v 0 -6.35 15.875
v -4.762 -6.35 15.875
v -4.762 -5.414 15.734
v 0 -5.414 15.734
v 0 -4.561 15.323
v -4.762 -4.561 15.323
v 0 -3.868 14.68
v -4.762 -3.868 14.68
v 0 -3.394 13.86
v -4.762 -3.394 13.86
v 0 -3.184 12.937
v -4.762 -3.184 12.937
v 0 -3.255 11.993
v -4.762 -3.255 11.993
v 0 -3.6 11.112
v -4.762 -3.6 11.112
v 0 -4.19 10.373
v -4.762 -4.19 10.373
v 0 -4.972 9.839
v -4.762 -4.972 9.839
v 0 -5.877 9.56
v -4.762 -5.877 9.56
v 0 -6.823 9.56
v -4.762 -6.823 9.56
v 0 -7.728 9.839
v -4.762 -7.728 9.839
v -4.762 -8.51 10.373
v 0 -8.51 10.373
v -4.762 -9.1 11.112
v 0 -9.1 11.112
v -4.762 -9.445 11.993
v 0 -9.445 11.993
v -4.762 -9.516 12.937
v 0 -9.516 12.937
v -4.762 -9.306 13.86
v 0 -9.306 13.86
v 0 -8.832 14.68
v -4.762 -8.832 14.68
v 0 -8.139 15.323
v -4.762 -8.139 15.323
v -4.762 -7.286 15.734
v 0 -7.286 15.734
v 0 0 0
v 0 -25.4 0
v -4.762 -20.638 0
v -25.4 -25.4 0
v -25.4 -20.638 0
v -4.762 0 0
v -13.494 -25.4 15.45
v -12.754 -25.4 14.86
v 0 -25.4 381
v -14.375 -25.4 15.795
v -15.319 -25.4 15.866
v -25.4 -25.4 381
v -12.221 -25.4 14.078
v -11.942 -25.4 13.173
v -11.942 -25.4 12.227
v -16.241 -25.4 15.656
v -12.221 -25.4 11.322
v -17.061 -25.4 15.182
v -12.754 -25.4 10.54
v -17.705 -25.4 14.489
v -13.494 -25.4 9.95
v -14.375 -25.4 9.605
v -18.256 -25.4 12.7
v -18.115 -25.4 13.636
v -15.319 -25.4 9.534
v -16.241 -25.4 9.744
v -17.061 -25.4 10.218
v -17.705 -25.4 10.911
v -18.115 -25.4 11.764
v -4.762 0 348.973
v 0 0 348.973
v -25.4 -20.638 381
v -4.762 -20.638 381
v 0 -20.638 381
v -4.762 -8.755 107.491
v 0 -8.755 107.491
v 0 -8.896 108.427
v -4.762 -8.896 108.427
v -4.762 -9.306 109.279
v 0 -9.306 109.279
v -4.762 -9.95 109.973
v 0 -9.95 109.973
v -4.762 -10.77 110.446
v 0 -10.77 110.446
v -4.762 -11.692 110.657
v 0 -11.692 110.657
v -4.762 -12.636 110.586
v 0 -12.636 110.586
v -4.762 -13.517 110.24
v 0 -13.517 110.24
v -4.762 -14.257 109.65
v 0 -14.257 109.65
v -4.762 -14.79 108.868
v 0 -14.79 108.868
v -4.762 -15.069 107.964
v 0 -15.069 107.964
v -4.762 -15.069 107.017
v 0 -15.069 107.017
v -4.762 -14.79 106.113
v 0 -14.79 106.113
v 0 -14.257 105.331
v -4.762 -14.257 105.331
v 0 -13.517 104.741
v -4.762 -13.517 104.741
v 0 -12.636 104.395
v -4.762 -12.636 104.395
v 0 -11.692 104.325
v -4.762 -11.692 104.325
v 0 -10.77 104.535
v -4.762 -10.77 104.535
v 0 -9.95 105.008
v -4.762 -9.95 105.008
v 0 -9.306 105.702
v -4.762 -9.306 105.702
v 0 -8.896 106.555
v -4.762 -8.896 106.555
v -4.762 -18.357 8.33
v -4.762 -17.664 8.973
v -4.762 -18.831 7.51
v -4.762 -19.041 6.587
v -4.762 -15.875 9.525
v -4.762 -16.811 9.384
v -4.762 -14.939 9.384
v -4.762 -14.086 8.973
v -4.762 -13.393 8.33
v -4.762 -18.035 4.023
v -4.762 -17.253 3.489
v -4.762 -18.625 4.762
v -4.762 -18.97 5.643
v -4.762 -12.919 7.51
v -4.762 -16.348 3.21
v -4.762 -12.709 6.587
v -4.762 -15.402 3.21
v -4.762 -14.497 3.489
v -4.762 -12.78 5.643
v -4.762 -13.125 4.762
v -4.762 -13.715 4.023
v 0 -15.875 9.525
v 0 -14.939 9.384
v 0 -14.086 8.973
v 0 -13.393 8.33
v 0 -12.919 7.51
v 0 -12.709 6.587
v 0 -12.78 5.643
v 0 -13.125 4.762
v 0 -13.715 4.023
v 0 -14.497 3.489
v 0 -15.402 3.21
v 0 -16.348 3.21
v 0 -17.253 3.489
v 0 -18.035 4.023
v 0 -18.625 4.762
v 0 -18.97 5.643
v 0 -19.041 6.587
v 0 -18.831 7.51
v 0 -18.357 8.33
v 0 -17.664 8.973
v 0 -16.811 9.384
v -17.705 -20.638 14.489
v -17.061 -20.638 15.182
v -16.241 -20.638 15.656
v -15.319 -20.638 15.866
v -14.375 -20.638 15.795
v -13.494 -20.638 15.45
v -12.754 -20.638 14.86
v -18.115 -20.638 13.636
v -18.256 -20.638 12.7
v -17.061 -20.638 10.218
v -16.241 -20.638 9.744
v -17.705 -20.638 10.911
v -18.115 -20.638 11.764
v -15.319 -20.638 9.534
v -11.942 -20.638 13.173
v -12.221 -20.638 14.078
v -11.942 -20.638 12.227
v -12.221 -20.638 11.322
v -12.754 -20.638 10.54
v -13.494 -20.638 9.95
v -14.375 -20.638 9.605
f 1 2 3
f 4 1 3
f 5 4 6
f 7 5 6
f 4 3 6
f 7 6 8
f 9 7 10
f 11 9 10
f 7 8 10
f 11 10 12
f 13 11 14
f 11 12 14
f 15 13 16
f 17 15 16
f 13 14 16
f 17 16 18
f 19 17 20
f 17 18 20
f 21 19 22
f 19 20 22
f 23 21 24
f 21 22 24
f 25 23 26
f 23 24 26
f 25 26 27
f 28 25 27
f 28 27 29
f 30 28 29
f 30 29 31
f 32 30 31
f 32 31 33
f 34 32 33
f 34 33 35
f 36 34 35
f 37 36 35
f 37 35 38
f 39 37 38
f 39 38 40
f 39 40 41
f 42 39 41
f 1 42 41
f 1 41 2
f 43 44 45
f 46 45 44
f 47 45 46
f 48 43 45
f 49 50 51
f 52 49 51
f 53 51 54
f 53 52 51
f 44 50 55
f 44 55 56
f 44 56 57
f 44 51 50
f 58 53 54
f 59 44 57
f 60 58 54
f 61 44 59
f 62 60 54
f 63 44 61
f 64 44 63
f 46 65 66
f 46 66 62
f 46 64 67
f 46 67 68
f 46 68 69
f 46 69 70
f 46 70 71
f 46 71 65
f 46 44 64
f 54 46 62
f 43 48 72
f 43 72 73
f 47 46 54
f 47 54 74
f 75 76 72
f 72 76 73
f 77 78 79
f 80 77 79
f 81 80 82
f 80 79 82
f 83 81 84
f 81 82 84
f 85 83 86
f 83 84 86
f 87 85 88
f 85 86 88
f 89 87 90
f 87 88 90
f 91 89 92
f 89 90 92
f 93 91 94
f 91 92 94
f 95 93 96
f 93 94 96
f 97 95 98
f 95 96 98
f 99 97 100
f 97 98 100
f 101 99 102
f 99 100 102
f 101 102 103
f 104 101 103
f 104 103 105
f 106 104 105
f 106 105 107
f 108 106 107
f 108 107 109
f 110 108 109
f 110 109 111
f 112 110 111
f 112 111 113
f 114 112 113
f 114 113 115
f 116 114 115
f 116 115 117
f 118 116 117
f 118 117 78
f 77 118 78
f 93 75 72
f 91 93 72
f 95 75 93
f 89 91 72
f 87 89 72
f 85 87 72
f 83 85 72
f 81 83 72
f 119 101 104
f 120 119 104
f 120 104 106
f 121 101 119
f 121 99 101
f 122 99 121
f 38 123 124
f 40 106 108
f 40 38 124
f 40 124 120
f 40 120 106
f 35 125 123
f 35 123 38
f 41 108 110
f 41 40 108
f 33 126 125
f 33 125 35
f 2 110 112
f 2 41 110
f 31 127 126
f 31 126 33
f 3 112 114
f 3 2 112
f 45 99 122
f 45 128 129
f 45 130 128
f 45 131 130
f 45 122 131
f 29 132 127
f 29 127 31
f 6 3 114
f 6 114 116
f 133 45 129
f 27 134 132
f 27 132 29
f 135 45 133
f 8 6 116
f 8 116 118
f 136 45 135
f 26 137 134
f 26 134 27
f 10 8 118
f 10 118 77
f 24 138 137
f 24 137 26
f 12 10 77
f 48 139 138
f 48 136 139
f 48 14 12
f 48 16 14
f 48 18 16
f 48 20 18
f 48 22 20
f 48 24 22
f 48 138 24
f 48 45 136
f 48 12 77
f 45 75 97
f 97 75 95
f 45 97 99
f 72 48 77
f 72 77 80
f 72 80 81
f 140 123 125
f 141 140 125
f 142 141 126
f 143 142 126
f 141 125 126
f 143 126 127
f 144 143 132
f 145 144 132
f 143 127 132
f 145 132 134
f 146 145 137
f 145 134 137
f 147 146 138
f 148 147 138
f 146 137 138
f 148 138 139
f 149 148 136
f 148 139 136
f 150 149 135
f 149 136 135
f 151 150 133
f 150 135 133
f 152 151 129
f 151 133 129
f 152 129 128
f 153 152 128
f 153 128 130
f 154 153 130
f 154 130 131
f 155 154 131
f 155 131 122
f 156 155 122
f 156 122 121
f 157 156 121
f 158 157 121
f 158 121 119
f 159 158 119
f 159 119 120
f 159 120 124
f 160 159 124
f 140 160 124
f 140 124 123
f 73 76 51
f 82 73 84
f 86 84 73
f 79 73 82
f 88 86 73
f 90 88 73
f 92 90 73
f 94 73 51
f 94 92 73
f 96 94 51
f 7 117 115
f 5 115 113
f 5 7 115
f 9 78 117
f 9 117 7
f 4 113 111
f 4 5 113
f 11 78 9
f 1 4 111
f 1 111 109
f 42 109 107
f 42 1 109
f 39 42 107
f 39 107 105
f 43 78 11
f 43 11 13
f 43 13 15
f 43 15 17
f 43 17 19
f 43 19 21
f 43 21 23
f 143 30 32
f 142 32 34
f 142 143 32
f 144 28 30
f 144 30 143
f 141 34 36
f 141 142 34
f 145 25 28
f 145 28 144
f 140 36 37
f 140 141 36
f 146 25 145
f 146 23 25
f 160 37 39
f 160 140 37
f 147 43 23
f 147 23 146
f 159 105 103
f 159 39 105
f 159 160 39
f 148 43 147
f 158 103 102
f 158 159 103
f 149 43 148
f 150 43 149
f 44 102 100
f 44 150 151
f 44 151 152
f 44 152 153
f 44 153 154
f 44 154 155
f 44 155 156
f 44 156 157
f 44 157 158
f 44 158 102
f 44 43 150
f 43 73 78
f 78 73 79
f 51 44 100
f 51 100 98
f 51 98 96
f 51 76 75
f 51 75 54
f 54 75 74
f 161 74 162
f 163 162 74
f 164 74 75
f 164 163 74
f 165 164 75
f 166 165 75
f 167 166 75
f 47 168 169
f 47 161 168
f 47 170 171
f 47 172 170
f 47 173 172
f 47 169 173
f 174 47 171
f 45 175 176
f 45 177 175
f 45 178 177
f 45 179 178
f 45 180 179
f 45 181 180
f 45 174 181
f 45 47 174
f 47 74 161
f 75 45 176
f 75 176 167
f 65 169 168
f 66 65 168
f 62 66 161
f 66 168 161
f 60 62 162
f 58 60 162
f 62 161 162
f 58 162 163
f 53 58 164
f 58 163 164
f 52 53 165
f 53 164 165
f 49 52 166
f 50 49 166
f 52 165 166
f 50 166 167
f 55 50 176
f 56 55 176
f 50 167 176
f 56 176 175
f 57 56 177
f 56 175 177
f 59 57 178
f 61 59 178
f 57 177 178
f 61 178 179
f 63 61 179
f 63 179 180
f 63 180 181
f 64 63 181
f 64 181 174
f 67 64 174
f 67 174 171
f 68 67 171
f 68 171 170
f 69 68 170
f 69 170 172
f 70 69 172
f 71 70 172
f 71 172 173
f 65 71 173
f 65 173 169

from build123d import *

# Parameters (mm, degrees)
BOSS_EXTRUDE1_DEPTH     = 381
CUT_EXTRUDE3_DEPTH      = 383.403015687
CUT_EXTRUDE3_DEPTH_BACK = 383.403015687
CUT_EXTRUDE4_REACH      = 384.403
SKETCH6_R               = 3.175
CUT_EXTRUDE5_REACH      = 384.69
SKETCH7_R               = 3.175
CUT_EXTRUDE6_REACH      = 384.403
SKETCH8_R               = 3.175


with BuildPart() as part:
    # Sketch1 → Boss-Extrude1 (new body)
    with BuildSketch(Plane.XY):
        Polygon((0, 0), (0, -25.4), (-25.4, -25.4), (-25.4, -20.6375), (-4.7625, -20.6375), (-4.7625, 0), align=None)
    extrude(amount=BOSS_EXTRUDE1_DEPTH)

    # Sketch4 → Cut-Extrude3 (cut, two sides: drawn at the far end of the back side and taken through both)
    with BuildSketch(Plane.ZY.offset(4.7625).offset(-CUT_EXTRUDE3_DEPTH_BACK)):
        Polygon((1030.877066877, -439.409233154), (381, -20.6375), (348.97339241, 0), (-300.903674467, 418.771733154), (536.63979184, 1718.525866908), (1868.420533185, 860.3449006), align=None)
    extrude(amount=CUT_EXTRUDE3_DEPTH + CUT_EXTRUDE3_DEPTH_BACK, mode=Mode.SUBTRACT)

    # Sketch6 → Cut-Extrude4 (cut, up to next)
    with BuildSketch(Plane.ZY.offset(4.7625), mode=Mode.PRIVATE) as cut_extrude4_sk1:
        with Locations((6.35, -15.875)):
            Circle(SKETCH6_R)
    cut_extrude4_tool1 = extrude(cut_extrude4_sk1.sketch, amount=-CUT_EXTRUDE4_REACH, mode=Mode.PRIVATE) & part.part
    # Sketch6 → Cut-Extrude4 (cut, up to next)
    with BuildSketch(Plane.ZY.offset(4.7625), mode=Mode.PRIVATE) as cut_extrude4_sk2:
        with Locations((12.7, -6.35)):
            Circle(SKETCH6_R)
    cut_extrude4_tool2 = extrude(cut_extrude4_sk2.sketch, amount=-CUT_EXTRUDE4_REACH, mode=Mode.PRIVATE) & part.part
    add(cut_extrude4_tool1.solids().sort_by_distance((-4.7625, -15.875, 6.35))[0], mode=Mode.SUBTRACT)
    add(cut_extrude4_tool2.solids().sort_by_distance((-4.7625, -6.35, 12.7))[0], mode=Mode.SUBTRACT)

    # Sketch7 → Cut-Extrude5 (cut, up to next)
    with BuildSketch(Plane(origin=(0, 0, 0), x_dir=(0, 0, -1), z_dir=(1, 0, 0)), mode=Mode.PRIVATE) as cut_extrude5_sk1:
        with Locations(Location((-107.490701513, -11.929615818, 0), (0, 0, 90))):
            Circle(SKETCH7_R)
    cut_extrude5_tool1 = extrude(cut_extrude5_sk1.sketch, amount=-CUT_EXTRUDE5_REACH, mode=Mode.PRIVATE) & part.part
    add(cut_extrude5_tool1.solids().sort_by_distance((0, -11.929616, 107.490702))[0], mode=Mode.SUBTRACT)

    # Sketch8 → Cut-Extrude6 (cut, up to next)
    with BuildSketch(Plane(origin=(0, -20.6375, 0), x_dir=(1, 0, 0), z_dir=(0, 1, 0)), mode=Mode.PRIVATE) as cut_extrude6_sk1:
        with Locations(Location((-15.08125, -12.7, 0), (0, 0, 180))):
            Circle(SKETCH8_R)
    cut_extrude6_tool1 = extrude(cut_extrude6_sk1.sketch, amount=-CUT_EXTRUDE6_REACH, mode=Mode.PRIVATE) & part.part
    add(cut_extrude6_tool1.solids().sort_by_distance((-15.08125, -20.6375, 12.7))[0], mode=Mode.SUBTRACT)


solid = part.part
